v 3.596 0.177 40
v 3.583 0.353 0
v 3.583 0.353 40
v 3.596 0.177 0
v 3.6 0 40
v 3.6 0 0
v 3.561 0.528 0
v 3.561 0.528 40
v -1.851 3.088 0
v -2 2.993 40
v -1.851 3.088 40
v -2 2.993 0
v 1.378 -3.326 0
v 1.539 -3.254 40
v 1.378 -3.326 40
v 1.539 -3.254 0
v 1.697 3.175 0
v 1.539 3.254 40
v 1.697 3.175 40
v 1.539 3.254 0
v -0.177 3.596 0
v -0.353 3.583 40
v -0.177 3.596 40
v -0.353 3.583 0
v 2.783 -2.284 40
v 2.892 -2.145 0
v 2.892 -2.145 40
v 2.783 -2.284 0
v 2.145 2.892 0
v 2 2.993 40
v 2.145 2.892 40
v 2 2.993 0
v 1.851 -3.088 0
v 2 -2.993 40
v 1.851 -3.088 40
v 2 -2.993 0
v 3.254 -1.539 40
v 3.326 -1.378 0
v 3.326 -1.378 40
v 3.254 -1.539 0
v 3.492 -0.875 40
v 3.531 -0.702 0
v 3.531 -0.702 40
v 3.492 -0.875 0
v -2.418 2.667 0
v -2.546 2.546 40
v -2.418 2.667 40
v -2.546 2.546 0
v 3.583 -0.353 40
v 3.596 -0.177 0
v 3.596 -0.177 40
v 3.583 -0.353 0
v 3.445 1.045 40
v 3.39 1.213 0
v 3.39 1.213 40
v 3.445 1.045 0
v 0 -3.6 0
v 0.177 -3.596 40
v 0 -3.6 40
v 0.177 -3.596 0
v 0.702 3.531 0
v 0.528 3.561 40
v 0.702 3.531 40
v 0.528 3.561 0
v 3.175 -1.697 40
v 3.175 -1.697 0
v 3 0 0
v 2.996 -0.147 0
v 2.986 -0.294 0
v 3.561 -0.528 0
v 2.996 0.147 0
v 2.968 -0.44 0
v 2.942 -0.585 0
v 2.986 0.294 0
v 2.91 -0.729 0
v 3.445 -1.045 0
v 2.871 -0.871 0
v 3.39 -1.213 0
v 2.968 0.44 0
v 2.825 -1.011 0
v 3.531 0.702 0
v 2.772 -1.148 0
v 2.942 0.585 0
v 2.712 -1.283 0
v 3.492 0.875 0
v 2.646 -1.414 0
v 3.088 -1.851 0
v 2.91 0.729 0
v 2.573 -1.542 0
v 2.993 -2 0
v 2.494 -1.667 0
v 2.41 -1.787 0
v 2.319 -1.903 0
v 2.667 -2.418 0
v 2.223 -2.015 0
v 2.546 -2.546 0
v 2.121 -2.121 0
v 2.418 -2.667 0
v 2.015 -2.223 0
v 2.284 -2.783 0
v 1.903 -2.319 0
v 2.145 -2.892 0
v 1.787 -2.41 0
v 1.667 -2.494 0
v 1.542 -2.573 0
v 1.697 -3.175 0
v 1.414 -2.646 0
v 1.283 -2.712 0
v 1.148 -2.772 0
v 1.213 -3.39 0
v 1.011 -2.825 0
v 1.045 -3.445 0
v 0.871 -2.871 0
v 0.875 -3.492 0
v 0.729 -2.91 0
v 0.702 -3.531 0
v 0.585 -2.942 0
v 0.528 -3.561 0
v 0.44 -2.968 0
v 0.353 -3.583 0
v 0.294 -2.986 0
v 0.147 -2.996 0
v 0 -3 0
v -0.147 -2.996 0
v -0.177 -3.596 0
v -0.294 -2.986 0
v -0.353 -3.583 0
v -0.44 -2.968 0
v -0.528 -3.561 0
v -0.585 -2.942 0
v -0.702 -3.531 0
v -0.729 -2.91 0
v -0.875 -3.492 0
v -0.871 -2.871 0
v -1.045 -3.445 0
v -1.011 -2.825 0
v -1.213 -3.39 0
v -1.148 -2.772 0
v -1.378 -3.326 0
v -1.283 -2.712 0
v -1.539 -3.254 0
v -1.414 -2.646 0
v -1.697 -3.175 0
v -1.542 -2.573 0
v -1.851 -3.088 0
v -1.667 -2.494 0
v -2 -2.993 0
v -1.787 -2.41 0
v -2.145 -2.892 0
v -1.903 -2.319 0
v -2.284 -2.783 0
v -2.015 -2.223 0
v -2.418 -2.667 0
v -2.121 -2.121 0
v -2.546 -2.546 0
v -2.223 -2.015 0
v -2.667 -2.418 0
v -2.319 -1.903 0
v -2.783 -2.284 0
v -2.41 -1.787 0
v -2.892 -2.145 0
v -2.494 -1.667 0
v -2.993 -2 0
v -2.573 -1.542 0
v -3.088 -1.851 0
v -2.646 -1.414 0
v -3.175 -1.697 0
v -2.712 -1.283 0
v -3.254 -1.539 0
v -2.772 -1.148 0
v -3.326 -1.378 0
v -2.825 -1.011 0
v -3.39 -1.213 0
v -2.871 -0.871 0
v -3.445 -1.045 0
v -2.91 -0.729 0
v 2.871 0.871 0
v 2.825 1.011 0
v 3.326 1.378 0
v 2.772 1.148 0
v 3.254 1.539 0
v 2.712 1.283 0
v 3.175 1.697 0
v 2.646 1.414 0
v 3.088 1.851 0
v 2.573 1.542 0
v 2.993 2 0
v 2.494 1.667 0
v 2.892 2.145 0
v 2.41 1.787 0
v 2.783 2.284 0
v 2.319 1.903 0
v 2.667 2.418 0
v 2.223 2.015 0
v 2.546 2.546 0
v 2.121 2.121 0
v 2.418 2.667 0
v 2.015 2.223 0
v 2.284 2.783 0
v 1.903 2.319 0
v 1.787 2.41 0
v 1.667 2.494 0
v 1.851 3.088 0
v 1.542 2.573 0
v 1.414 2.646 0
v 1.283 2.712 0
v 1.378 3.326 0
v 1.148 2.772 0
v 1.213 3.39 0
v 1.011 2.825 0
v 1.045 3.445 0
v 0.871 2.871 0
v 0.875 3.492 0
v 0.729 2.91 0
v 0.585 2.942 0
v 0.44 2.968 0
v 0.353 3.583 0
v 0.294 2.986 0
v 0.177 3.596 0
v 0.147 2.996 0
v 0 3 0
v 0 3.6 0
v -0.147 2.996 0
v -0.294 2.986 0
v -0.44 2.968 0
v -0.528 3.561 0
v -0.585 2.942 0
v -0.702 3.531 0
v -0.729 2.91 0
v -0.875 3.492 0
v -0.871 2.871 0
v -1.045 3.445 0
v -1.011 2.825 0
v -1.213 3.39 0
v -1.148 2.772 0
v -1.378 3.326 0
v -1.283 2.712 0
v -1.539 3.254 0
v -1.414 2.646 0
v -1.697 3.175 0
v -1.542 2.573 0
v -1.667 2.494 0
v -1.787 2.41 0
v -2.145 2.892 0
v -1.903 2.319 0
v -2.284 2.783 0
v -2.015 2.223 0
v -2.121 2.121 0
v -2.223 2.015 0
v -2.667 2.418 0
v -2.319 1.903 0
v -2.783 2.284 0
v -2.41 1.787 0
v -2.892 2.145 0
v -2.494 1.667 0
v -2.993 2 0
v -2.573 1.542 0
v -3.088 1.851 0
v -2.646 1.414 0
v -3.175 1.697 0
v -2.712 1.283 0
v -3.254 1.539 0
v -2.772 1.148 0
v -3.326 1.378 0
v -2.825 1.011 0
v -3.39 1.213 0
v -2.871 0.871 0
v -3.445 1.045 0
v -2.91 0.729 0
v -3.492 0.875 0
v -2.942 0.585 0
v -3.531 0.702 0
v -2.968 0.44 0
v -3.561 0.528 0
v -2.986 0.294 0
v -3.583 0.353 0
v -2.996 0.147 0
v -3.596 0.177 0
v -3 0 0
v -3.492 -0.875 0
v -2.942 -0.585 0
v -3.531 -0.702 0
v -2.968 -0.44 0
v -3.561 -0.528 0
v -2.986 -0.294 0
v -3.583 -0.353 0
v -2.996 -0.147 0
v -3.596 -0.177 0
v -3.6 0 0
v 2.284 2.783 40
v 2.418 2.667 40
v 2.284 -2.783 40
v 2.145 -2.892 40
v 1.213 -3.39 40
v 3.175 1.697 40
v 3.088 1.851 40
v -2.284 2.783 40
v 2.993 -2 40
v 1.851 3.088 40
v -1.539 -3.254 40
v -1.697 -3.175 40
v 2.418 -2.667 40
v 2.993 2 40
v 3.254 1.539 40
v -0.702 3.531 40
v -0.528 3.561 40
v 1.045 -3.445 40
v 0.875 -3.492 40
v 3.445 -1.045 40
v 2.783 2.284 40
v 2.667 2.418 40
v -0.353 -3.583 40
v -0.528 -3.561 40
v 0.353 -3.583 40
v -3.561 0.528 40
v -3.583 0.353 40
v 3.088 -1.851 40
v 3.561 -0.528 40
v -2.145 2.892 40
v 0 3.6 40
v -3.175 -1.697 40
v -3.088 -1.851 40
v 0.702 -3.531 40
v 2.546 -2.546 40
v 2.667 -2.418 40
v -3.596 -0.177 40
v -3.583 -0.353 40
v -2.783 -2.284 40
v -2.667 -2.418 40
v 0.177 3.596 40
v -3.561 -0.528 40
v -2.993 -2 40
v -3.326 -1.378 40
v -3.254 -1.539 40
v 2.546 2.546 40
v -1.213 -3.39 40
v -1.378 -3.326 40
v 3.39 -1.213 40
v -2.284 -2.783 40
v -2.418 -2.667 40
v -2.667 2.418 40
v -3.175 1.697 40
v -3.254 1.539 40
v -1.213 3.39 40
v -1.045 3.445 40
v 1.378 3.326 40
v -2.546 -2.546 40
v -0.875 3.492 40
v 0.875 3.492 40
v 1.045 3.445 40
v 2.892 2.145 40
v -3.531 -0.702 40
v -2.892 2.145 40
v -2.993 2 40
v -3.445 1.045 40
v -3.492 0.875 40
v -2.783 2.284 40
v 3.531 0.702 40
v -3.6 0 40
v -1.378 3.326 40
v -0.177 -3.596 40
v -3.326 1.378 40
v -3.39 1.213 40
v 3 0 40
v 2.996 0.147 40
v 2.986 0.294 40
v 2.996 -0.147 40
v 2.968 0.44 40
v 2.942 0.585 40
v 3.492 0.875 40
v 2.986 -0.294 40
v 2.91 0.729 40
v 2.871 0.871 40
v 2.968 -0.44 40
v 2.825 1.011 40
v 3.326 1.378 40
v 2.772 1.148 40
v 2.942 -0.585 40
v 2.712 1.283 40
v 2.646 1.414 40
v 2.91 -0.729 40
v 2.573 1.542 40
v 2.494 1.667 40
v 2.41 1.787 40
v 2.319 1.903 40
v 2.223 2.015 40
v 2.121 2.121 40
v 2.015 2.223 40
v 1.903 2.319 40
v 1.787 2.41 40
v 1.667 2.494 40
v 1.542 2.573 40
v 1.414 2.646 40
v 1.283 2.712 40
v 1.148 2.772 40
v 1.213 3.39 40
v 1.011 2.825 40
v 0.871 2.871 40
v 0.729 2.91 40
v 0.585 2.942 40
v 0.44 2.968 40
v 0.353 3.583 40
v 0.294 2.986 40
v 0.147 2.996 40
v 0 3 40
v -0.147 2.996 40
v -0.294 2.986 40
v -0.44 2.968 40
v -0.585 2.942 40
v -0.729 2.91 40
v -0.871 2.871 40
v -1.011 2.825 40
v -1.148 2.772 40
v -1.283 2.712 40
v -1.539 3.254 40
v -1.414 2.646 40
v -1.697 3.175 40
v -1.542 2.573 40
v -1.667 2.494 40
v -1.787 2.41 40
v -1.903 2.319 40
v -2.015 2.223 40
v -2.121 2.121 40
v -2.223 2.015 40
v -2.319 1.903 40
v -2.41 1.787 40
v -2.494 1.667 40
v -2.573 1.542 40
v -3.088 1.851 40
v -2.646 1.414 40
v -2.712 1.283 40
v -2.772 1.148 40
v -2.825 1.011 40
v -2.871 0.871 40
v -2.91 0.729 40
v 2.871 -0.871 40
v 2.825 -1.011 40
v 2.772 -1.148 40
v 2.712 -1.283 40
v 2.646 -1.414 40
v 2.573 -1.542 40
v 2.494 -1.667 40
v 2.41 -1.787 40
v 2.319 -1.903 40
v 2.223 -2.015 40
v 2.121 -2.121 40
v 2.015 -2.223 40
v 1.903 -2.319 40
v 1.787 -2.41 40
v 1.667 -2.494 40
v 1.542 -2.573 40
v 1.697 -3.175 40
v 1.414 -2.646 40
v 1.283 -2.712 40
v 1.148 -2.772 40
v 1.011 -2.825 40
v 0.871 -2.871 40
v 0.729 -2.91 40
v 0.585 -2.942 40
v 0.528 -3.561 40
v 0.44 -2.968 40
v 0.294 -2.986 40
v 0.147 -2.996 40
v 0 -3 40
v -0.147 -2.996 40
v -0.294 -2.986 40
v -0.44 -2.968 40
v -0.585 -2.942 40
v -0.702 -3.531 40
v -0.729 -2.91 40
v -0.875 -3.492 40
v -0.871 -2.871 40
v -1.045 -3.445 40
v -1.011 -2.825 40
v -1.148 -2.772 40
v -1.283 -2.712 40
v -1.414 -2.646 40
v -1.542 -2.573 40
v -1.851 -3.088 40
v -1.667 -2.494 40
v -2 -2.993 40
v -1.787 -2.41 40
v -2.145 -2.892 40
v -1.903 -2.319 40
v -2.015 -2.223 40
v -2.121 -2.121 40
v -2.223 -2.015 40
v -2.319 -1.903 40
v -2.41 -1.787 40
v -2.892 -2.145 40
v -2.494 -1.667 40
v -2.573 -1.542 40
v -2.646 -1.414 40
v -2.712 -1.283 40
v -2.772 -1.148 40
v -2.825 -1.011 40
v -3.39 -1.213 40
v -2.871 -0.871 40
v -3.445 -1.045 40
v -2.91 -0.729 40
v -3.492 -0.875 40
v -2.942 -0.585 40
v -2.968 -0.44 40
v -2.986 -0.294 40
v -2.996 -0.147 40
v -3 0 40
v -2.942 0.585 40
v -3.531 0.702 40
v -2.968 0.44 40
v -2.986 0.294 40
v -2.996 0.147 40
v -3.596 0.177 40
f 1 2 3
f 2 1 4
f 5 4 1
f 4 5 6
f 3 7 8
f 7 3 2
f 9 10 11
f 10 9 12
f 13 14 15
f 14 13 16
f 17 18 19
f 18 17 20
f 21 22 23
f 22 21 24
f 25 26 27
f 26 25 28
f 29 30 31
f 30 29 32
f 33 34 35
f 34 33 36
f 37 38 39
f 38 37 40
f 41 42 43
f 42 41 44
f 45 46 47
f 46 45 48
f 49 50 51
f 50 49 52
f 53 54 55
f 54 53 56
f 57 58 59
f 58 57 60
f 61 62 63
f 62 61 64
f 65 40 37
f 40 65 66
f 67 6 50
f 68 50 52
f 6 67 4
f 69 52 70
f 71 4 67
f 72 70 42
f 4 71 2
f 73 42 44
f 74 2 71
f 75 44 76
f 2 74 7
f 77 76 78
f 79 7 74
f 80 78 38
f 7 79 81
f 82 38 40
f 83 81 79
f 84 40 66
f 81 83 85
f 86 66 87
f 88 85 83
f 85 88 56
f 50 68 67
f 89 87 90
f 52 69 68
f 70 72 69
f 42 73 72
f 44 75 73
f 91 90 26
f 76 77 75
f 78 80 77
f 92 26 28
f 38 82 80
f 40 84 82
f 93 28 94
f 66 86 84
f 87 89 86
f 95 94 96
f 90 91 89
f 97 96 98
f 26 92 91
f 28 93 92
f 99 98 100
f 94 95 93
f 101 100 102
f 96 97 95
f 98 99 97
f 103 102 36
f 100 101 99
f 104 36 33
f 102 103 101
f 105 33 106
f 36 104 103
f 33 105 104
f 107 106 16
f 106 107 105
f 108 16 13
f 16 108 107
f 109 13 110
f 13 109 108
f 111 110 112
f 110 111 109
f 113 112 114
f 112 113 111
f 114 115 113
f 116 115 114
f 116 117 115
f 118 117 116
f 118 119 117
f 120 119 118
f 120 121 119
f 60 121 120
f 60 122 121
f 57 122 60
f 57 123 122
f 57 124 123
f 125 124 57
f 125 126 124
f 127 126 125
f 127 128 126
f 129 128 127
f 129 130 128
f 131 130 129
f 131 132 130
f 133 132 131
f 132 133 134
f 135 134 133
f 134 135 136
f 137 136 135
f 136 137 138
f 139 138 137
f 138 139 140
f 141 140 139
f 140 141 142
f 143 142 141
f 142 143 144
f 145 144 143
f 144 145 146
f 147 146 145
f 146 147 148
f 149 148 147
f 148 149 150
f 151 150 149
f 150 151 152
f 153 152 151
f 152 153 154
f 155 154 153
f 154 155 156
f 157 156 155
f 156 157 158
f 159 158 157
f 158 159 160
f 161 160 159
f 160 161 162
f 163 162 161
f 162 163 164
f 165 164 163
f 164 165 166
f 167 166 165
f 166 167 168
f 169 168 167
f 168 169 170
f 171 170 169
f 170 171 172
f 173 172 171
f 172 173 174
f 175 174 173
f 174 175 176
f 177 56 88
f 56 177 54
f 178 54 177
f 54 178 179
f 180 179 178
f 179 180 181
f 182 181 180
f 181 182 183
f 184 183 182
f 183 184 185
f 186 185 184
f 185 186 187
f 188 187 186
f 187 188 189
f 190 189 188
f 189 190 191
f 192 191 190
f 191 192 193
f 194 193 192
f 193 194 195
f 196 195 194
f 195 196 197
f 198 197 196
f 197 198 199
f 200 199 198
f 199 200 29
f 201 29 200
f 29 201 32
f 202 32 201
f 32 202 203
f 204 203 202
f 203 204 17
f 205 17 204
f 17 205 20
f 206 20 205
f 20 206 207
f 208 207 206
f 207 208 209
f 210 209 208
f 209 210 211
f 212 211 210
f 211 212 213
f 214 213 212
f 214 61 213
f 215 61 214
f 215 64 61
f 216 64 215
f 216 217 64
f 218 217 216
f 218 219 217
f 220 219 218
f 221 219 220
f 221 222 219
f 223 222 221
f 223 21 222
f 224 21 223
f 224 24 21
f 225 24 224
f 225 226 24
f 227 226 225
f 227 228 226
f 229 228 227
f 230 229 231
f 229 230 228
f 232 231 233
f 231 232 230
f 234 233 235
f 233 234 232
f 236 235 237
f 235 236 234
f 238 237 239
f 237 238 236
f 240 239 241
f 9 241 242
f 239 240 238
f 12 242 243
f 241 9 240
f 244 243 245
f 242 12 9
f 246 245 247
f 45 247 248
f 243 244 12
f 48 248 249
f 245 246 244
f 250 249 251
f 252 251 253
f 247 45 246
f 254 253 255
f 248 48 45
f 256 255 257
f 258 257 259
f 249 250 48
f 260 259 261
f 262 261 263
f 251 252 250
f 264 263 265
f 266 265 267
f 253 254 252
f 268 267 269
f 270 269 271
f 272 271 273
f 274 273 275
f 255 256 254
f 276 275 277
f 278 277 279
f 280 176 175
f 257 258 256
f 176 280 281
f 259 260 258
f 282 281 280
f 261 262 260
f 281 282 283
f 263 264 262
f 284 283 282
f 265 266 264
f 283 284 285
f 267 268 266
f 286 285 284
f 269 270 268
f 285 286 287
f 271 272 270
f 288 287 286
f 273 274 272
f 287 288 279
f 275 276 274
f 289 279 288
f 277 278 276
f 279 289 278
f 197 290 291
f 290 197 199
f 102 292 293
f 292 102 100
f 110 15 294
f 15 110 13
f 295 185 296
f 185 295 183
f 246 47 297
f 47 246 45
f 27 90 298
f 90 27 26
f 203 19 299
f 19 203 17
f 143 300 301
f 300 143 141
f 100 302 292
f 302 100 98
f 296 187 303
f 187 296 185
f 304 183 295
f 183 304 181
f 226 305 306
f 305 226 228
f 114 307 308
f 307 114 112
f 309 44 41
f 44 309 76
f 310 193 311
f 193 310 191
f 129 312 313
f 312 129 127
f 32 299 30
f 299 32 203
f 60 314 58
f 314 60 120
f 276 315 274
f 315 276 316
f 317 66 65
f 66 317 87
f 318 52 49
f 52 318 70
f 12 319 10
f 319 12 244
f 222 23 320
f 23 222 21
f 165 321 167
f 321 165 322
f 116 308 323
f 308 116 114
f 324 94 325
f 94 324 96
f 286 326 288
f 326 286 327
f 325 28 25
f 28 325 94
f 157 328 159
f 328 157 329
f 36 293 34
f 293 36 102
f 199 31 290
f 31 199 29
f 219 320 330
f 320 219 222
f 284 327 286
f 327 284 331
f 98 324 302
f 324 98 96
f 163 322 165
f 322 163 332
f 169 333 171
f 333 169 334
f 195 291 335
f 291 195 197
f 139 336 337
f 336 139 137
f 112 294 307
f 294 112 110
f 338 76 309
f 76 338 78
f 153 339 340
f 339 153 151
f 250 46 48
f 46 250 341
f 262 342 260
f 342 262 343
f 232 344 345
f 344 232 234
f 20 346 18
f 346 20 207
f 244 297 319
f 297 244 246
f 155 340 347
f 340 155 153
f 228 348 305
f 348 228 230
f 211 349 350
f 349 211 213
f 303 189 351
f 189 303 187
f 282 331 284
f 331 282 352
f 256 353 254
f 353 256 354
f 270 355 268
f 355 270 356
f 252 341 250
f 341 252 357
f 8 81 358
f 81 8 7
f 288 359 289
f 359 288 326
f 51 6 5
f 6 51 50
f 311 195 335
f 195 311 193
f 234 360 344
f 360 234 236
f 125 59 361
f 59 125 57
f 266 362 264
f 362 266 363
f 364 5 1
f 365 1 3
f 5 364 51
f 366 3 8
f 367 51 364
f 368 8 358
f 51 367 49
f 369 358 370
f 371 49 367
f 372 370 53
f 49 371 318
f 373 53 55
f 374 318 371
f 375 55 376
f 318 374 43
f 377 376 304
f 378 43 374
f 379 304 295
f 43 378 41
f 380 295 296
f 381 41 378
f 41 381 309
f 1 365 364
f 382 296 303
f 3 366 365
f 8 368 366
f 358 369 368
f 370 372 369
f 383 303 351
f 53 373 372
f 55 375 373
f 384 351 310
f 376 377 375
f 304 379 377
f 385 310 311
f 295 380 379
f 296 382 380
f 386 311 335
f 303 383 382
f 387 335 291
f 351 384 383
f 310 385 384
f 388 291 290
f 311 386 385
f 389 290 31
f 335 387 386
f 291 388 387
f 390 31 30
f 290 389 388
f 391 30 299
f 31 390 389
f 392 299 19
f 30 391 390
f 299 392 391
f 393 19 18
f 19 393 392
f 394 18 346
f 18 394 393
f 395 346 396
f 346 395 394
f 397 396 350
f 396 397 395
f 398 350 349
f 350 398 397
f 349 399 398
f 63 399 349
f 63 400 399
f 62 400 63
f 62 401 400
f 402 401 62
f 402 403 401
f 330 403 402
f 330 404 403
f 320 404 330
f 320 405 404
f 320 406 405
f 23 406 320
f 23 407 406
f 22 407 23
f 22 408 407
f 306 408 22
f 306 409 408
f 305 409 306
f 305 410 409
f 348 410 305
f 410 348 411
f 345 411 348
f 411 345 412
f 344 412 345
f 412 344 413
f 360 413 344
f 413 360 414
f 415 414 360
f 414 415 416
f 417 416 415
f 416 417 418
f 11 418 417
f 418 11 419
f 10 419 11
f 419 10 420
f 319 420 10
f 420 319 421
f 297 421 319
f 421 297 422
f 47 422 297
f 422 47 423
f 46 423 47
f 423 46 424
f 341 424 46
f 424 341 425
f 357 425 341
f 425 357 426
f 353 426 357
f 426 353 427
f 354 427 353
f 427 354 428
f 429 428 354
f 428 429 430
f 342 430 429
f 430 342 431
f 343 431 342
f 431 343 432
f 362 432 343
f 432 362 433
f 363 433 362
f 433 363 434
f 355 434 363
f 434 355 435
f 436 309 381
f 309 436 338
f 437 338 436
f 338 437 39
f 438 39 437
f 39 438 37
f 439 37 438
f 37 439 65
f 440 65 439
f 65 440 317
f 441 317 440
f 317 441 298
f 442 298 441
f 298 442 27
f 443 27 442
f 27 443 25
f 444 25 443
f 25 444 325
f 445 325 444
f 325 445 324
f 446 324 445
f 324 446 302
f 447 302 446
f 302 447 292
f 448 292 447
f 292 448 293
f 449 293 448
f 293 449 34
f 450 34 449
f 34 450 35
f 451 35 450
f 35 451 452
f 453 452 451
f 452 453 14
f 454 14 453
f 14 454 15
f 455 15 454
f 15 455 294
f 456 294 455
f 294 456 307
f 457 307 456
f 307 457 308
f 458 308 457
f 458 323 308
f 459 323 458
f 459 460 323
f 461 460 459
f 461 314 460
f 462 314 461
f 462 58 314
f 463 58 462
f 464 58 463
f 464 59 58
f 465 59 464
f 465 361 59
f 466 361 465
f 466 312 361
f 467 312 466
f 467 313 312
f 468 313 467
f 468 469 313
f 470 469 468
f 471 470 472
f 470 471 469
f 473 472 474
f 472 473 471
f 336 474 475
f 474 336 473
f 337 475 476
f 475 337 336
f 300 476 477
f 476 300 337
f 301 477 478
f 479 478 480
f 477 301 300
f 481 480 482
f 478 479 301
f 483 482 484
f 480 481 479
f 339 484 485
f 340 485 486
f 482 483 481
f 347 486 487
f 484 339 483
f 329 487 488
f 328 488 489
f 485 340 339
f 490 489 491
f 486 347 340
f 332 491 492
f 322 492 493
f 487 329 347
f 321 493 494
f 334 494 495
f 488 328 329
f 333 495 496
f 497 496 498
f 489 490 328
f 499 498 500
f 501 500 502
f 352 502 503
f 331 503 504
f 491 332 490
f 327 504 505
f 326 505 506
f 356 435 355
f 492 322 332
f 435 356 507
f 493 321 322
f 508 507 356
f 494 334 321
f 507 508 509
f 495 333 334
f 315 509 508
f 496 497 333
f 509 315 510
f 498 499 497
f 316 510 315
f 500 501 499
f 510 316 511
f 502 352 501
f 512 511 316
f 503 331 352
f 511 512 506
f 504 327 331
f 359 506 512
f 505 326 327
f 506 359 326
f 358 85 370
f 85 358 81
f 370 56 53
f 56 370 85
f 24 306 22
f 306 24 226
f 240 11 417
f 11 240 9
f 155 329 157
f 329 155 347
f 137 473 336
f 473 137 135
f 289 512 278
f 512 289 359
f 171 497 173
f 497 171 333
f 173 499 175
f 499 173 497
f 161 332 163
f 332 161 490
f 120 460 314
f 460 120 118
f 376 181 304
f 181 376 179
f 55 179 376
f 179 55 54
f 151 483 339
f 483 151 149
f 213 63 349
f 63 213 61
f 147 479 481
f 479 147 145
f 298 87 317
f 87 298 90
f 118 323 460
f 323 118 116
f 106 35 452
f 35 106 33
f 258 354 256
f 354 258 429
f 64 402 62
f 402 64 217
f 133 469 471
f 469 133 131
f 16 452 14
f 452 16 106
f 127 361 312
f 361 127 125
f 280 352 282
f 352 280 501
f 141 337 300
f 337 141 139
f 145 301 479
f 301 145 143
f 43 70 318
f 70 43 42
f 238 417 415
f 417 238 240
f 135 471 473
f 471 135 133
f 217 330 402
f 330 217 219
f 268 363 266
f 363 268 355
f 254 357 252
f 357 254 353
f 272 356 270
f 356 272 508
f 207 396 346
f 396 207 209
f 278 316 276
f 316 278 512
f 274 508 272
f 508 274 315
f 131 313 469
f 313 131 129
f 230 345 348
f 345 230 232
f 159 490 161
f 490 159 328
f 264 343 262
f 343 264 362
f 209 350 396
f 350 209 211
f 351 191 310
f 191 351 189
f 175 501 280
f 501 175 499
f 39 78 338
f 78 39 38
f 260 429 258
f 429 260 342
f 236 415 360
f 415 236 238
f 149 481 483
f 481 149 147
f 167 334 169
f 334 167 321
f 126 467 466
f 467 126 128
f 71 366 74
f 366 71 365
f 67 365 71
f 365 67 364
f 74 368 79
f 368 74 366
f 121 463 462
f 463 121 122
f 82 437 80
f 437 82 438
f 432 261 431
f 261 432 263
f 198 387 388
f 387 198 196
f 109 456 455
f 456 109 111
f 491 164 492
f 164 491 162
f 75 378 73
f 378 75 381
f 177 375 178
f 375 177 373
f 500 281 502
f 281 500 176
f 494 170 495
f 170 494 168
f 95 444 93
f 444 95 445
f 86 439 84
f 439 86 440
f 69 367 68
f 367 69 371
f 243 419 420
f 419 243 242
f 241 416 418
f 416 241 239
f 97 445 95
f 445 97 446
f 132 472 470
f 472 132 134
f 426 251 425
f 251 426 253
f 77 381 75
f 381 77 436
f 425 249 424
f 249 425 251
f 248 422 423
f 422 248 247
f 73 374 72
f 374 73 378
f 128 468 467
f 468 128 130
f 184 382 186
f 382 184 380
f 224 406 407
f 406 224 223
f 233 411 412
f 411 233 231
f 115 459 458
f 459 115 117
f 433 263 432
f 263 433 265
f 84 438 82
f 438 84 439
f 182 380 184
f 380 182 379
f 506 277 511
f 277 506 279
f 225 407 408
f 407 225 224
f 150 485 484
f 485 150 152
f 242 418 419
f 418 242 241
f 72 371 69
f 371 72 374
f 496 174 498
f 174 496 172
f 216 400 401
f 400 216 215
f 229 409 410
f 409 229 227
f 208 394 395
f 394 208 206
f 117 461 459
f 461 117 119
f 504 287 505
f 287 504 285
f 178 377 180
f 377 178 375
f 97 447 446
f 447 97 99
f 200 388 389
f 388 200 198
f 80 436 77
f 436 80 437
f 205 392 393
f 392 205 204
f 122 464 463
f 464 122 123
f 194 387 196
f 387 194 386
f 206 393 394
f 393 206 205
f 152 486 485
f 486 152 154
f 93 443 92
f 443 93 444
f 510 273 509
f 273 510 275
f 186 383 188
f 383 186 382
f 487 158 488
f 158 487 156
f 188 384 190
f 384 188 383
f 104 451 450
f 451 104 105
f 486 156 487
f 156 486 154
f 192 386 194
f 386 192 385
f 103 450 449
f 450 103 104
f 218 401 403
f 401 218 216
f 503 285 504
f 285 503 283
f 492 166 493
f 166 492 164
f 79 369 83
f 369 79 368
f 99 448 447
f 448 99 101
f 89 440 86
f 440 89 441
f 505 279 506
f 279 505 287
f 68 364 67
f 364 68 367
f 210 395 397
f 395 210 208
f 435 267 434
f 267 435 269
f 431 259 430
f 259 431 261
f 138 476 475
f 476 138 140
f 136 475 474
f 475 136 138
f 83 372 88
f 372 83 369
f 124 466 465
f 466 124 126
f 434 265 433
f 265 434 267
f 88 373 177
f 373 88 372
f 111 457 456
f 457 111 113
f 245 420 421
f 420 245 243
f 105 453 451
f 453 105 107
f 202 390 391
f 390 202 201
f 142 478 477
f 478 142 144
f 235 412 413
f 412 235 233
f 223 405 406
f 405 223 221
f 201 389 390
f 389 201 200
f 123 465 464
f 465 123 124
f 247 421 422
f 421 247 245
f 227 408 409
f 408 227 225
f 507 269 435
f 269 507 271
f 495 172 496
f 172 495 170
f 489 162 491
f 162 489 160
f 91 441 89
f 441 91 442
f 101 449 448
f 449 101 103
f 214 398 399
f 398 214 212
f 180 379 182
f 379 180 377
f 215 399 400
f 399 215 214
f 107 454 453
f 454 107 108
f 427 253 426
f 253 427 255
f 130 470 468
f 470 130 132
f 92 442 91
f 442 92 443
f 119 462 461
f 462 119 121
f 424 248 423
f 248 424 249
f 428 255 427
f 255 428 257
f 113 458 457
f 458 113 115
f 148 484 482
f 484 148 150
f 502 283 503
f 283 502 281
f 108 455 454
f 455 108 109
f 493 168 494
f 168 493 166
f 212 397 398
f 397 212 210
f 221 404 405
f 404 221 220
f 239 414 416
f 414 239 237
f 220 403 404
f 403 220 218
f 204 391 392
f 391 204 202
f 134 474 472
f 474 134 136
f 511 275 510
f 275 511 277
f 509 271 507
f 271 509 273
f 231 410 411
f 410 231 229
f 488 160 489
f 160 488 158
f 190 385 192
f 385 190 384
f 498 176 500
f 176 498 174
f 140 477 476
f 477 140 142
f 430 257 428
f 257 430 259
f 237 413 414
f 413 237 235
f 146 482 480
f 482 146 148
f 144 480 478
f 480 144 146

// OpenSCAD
$fn = 128;

// Heatshrink sleeving (tubing)
inner_d = 6;          // mm
wall_thickness = 0.6; // mm
length = 40;          // mm

outer_d = inner_d + 2 * wall_thickness;

module heatshrink_sleeve(id, od, h) {
    difference() {
        cylinder(d = od, h = h, center = false);
        translate([0, 0, -0.1])
            cylinder(d = id, h = h + 0.2, center = false);
    }
}

heatshrink_sleeve(inner_d, outer_d, length);
